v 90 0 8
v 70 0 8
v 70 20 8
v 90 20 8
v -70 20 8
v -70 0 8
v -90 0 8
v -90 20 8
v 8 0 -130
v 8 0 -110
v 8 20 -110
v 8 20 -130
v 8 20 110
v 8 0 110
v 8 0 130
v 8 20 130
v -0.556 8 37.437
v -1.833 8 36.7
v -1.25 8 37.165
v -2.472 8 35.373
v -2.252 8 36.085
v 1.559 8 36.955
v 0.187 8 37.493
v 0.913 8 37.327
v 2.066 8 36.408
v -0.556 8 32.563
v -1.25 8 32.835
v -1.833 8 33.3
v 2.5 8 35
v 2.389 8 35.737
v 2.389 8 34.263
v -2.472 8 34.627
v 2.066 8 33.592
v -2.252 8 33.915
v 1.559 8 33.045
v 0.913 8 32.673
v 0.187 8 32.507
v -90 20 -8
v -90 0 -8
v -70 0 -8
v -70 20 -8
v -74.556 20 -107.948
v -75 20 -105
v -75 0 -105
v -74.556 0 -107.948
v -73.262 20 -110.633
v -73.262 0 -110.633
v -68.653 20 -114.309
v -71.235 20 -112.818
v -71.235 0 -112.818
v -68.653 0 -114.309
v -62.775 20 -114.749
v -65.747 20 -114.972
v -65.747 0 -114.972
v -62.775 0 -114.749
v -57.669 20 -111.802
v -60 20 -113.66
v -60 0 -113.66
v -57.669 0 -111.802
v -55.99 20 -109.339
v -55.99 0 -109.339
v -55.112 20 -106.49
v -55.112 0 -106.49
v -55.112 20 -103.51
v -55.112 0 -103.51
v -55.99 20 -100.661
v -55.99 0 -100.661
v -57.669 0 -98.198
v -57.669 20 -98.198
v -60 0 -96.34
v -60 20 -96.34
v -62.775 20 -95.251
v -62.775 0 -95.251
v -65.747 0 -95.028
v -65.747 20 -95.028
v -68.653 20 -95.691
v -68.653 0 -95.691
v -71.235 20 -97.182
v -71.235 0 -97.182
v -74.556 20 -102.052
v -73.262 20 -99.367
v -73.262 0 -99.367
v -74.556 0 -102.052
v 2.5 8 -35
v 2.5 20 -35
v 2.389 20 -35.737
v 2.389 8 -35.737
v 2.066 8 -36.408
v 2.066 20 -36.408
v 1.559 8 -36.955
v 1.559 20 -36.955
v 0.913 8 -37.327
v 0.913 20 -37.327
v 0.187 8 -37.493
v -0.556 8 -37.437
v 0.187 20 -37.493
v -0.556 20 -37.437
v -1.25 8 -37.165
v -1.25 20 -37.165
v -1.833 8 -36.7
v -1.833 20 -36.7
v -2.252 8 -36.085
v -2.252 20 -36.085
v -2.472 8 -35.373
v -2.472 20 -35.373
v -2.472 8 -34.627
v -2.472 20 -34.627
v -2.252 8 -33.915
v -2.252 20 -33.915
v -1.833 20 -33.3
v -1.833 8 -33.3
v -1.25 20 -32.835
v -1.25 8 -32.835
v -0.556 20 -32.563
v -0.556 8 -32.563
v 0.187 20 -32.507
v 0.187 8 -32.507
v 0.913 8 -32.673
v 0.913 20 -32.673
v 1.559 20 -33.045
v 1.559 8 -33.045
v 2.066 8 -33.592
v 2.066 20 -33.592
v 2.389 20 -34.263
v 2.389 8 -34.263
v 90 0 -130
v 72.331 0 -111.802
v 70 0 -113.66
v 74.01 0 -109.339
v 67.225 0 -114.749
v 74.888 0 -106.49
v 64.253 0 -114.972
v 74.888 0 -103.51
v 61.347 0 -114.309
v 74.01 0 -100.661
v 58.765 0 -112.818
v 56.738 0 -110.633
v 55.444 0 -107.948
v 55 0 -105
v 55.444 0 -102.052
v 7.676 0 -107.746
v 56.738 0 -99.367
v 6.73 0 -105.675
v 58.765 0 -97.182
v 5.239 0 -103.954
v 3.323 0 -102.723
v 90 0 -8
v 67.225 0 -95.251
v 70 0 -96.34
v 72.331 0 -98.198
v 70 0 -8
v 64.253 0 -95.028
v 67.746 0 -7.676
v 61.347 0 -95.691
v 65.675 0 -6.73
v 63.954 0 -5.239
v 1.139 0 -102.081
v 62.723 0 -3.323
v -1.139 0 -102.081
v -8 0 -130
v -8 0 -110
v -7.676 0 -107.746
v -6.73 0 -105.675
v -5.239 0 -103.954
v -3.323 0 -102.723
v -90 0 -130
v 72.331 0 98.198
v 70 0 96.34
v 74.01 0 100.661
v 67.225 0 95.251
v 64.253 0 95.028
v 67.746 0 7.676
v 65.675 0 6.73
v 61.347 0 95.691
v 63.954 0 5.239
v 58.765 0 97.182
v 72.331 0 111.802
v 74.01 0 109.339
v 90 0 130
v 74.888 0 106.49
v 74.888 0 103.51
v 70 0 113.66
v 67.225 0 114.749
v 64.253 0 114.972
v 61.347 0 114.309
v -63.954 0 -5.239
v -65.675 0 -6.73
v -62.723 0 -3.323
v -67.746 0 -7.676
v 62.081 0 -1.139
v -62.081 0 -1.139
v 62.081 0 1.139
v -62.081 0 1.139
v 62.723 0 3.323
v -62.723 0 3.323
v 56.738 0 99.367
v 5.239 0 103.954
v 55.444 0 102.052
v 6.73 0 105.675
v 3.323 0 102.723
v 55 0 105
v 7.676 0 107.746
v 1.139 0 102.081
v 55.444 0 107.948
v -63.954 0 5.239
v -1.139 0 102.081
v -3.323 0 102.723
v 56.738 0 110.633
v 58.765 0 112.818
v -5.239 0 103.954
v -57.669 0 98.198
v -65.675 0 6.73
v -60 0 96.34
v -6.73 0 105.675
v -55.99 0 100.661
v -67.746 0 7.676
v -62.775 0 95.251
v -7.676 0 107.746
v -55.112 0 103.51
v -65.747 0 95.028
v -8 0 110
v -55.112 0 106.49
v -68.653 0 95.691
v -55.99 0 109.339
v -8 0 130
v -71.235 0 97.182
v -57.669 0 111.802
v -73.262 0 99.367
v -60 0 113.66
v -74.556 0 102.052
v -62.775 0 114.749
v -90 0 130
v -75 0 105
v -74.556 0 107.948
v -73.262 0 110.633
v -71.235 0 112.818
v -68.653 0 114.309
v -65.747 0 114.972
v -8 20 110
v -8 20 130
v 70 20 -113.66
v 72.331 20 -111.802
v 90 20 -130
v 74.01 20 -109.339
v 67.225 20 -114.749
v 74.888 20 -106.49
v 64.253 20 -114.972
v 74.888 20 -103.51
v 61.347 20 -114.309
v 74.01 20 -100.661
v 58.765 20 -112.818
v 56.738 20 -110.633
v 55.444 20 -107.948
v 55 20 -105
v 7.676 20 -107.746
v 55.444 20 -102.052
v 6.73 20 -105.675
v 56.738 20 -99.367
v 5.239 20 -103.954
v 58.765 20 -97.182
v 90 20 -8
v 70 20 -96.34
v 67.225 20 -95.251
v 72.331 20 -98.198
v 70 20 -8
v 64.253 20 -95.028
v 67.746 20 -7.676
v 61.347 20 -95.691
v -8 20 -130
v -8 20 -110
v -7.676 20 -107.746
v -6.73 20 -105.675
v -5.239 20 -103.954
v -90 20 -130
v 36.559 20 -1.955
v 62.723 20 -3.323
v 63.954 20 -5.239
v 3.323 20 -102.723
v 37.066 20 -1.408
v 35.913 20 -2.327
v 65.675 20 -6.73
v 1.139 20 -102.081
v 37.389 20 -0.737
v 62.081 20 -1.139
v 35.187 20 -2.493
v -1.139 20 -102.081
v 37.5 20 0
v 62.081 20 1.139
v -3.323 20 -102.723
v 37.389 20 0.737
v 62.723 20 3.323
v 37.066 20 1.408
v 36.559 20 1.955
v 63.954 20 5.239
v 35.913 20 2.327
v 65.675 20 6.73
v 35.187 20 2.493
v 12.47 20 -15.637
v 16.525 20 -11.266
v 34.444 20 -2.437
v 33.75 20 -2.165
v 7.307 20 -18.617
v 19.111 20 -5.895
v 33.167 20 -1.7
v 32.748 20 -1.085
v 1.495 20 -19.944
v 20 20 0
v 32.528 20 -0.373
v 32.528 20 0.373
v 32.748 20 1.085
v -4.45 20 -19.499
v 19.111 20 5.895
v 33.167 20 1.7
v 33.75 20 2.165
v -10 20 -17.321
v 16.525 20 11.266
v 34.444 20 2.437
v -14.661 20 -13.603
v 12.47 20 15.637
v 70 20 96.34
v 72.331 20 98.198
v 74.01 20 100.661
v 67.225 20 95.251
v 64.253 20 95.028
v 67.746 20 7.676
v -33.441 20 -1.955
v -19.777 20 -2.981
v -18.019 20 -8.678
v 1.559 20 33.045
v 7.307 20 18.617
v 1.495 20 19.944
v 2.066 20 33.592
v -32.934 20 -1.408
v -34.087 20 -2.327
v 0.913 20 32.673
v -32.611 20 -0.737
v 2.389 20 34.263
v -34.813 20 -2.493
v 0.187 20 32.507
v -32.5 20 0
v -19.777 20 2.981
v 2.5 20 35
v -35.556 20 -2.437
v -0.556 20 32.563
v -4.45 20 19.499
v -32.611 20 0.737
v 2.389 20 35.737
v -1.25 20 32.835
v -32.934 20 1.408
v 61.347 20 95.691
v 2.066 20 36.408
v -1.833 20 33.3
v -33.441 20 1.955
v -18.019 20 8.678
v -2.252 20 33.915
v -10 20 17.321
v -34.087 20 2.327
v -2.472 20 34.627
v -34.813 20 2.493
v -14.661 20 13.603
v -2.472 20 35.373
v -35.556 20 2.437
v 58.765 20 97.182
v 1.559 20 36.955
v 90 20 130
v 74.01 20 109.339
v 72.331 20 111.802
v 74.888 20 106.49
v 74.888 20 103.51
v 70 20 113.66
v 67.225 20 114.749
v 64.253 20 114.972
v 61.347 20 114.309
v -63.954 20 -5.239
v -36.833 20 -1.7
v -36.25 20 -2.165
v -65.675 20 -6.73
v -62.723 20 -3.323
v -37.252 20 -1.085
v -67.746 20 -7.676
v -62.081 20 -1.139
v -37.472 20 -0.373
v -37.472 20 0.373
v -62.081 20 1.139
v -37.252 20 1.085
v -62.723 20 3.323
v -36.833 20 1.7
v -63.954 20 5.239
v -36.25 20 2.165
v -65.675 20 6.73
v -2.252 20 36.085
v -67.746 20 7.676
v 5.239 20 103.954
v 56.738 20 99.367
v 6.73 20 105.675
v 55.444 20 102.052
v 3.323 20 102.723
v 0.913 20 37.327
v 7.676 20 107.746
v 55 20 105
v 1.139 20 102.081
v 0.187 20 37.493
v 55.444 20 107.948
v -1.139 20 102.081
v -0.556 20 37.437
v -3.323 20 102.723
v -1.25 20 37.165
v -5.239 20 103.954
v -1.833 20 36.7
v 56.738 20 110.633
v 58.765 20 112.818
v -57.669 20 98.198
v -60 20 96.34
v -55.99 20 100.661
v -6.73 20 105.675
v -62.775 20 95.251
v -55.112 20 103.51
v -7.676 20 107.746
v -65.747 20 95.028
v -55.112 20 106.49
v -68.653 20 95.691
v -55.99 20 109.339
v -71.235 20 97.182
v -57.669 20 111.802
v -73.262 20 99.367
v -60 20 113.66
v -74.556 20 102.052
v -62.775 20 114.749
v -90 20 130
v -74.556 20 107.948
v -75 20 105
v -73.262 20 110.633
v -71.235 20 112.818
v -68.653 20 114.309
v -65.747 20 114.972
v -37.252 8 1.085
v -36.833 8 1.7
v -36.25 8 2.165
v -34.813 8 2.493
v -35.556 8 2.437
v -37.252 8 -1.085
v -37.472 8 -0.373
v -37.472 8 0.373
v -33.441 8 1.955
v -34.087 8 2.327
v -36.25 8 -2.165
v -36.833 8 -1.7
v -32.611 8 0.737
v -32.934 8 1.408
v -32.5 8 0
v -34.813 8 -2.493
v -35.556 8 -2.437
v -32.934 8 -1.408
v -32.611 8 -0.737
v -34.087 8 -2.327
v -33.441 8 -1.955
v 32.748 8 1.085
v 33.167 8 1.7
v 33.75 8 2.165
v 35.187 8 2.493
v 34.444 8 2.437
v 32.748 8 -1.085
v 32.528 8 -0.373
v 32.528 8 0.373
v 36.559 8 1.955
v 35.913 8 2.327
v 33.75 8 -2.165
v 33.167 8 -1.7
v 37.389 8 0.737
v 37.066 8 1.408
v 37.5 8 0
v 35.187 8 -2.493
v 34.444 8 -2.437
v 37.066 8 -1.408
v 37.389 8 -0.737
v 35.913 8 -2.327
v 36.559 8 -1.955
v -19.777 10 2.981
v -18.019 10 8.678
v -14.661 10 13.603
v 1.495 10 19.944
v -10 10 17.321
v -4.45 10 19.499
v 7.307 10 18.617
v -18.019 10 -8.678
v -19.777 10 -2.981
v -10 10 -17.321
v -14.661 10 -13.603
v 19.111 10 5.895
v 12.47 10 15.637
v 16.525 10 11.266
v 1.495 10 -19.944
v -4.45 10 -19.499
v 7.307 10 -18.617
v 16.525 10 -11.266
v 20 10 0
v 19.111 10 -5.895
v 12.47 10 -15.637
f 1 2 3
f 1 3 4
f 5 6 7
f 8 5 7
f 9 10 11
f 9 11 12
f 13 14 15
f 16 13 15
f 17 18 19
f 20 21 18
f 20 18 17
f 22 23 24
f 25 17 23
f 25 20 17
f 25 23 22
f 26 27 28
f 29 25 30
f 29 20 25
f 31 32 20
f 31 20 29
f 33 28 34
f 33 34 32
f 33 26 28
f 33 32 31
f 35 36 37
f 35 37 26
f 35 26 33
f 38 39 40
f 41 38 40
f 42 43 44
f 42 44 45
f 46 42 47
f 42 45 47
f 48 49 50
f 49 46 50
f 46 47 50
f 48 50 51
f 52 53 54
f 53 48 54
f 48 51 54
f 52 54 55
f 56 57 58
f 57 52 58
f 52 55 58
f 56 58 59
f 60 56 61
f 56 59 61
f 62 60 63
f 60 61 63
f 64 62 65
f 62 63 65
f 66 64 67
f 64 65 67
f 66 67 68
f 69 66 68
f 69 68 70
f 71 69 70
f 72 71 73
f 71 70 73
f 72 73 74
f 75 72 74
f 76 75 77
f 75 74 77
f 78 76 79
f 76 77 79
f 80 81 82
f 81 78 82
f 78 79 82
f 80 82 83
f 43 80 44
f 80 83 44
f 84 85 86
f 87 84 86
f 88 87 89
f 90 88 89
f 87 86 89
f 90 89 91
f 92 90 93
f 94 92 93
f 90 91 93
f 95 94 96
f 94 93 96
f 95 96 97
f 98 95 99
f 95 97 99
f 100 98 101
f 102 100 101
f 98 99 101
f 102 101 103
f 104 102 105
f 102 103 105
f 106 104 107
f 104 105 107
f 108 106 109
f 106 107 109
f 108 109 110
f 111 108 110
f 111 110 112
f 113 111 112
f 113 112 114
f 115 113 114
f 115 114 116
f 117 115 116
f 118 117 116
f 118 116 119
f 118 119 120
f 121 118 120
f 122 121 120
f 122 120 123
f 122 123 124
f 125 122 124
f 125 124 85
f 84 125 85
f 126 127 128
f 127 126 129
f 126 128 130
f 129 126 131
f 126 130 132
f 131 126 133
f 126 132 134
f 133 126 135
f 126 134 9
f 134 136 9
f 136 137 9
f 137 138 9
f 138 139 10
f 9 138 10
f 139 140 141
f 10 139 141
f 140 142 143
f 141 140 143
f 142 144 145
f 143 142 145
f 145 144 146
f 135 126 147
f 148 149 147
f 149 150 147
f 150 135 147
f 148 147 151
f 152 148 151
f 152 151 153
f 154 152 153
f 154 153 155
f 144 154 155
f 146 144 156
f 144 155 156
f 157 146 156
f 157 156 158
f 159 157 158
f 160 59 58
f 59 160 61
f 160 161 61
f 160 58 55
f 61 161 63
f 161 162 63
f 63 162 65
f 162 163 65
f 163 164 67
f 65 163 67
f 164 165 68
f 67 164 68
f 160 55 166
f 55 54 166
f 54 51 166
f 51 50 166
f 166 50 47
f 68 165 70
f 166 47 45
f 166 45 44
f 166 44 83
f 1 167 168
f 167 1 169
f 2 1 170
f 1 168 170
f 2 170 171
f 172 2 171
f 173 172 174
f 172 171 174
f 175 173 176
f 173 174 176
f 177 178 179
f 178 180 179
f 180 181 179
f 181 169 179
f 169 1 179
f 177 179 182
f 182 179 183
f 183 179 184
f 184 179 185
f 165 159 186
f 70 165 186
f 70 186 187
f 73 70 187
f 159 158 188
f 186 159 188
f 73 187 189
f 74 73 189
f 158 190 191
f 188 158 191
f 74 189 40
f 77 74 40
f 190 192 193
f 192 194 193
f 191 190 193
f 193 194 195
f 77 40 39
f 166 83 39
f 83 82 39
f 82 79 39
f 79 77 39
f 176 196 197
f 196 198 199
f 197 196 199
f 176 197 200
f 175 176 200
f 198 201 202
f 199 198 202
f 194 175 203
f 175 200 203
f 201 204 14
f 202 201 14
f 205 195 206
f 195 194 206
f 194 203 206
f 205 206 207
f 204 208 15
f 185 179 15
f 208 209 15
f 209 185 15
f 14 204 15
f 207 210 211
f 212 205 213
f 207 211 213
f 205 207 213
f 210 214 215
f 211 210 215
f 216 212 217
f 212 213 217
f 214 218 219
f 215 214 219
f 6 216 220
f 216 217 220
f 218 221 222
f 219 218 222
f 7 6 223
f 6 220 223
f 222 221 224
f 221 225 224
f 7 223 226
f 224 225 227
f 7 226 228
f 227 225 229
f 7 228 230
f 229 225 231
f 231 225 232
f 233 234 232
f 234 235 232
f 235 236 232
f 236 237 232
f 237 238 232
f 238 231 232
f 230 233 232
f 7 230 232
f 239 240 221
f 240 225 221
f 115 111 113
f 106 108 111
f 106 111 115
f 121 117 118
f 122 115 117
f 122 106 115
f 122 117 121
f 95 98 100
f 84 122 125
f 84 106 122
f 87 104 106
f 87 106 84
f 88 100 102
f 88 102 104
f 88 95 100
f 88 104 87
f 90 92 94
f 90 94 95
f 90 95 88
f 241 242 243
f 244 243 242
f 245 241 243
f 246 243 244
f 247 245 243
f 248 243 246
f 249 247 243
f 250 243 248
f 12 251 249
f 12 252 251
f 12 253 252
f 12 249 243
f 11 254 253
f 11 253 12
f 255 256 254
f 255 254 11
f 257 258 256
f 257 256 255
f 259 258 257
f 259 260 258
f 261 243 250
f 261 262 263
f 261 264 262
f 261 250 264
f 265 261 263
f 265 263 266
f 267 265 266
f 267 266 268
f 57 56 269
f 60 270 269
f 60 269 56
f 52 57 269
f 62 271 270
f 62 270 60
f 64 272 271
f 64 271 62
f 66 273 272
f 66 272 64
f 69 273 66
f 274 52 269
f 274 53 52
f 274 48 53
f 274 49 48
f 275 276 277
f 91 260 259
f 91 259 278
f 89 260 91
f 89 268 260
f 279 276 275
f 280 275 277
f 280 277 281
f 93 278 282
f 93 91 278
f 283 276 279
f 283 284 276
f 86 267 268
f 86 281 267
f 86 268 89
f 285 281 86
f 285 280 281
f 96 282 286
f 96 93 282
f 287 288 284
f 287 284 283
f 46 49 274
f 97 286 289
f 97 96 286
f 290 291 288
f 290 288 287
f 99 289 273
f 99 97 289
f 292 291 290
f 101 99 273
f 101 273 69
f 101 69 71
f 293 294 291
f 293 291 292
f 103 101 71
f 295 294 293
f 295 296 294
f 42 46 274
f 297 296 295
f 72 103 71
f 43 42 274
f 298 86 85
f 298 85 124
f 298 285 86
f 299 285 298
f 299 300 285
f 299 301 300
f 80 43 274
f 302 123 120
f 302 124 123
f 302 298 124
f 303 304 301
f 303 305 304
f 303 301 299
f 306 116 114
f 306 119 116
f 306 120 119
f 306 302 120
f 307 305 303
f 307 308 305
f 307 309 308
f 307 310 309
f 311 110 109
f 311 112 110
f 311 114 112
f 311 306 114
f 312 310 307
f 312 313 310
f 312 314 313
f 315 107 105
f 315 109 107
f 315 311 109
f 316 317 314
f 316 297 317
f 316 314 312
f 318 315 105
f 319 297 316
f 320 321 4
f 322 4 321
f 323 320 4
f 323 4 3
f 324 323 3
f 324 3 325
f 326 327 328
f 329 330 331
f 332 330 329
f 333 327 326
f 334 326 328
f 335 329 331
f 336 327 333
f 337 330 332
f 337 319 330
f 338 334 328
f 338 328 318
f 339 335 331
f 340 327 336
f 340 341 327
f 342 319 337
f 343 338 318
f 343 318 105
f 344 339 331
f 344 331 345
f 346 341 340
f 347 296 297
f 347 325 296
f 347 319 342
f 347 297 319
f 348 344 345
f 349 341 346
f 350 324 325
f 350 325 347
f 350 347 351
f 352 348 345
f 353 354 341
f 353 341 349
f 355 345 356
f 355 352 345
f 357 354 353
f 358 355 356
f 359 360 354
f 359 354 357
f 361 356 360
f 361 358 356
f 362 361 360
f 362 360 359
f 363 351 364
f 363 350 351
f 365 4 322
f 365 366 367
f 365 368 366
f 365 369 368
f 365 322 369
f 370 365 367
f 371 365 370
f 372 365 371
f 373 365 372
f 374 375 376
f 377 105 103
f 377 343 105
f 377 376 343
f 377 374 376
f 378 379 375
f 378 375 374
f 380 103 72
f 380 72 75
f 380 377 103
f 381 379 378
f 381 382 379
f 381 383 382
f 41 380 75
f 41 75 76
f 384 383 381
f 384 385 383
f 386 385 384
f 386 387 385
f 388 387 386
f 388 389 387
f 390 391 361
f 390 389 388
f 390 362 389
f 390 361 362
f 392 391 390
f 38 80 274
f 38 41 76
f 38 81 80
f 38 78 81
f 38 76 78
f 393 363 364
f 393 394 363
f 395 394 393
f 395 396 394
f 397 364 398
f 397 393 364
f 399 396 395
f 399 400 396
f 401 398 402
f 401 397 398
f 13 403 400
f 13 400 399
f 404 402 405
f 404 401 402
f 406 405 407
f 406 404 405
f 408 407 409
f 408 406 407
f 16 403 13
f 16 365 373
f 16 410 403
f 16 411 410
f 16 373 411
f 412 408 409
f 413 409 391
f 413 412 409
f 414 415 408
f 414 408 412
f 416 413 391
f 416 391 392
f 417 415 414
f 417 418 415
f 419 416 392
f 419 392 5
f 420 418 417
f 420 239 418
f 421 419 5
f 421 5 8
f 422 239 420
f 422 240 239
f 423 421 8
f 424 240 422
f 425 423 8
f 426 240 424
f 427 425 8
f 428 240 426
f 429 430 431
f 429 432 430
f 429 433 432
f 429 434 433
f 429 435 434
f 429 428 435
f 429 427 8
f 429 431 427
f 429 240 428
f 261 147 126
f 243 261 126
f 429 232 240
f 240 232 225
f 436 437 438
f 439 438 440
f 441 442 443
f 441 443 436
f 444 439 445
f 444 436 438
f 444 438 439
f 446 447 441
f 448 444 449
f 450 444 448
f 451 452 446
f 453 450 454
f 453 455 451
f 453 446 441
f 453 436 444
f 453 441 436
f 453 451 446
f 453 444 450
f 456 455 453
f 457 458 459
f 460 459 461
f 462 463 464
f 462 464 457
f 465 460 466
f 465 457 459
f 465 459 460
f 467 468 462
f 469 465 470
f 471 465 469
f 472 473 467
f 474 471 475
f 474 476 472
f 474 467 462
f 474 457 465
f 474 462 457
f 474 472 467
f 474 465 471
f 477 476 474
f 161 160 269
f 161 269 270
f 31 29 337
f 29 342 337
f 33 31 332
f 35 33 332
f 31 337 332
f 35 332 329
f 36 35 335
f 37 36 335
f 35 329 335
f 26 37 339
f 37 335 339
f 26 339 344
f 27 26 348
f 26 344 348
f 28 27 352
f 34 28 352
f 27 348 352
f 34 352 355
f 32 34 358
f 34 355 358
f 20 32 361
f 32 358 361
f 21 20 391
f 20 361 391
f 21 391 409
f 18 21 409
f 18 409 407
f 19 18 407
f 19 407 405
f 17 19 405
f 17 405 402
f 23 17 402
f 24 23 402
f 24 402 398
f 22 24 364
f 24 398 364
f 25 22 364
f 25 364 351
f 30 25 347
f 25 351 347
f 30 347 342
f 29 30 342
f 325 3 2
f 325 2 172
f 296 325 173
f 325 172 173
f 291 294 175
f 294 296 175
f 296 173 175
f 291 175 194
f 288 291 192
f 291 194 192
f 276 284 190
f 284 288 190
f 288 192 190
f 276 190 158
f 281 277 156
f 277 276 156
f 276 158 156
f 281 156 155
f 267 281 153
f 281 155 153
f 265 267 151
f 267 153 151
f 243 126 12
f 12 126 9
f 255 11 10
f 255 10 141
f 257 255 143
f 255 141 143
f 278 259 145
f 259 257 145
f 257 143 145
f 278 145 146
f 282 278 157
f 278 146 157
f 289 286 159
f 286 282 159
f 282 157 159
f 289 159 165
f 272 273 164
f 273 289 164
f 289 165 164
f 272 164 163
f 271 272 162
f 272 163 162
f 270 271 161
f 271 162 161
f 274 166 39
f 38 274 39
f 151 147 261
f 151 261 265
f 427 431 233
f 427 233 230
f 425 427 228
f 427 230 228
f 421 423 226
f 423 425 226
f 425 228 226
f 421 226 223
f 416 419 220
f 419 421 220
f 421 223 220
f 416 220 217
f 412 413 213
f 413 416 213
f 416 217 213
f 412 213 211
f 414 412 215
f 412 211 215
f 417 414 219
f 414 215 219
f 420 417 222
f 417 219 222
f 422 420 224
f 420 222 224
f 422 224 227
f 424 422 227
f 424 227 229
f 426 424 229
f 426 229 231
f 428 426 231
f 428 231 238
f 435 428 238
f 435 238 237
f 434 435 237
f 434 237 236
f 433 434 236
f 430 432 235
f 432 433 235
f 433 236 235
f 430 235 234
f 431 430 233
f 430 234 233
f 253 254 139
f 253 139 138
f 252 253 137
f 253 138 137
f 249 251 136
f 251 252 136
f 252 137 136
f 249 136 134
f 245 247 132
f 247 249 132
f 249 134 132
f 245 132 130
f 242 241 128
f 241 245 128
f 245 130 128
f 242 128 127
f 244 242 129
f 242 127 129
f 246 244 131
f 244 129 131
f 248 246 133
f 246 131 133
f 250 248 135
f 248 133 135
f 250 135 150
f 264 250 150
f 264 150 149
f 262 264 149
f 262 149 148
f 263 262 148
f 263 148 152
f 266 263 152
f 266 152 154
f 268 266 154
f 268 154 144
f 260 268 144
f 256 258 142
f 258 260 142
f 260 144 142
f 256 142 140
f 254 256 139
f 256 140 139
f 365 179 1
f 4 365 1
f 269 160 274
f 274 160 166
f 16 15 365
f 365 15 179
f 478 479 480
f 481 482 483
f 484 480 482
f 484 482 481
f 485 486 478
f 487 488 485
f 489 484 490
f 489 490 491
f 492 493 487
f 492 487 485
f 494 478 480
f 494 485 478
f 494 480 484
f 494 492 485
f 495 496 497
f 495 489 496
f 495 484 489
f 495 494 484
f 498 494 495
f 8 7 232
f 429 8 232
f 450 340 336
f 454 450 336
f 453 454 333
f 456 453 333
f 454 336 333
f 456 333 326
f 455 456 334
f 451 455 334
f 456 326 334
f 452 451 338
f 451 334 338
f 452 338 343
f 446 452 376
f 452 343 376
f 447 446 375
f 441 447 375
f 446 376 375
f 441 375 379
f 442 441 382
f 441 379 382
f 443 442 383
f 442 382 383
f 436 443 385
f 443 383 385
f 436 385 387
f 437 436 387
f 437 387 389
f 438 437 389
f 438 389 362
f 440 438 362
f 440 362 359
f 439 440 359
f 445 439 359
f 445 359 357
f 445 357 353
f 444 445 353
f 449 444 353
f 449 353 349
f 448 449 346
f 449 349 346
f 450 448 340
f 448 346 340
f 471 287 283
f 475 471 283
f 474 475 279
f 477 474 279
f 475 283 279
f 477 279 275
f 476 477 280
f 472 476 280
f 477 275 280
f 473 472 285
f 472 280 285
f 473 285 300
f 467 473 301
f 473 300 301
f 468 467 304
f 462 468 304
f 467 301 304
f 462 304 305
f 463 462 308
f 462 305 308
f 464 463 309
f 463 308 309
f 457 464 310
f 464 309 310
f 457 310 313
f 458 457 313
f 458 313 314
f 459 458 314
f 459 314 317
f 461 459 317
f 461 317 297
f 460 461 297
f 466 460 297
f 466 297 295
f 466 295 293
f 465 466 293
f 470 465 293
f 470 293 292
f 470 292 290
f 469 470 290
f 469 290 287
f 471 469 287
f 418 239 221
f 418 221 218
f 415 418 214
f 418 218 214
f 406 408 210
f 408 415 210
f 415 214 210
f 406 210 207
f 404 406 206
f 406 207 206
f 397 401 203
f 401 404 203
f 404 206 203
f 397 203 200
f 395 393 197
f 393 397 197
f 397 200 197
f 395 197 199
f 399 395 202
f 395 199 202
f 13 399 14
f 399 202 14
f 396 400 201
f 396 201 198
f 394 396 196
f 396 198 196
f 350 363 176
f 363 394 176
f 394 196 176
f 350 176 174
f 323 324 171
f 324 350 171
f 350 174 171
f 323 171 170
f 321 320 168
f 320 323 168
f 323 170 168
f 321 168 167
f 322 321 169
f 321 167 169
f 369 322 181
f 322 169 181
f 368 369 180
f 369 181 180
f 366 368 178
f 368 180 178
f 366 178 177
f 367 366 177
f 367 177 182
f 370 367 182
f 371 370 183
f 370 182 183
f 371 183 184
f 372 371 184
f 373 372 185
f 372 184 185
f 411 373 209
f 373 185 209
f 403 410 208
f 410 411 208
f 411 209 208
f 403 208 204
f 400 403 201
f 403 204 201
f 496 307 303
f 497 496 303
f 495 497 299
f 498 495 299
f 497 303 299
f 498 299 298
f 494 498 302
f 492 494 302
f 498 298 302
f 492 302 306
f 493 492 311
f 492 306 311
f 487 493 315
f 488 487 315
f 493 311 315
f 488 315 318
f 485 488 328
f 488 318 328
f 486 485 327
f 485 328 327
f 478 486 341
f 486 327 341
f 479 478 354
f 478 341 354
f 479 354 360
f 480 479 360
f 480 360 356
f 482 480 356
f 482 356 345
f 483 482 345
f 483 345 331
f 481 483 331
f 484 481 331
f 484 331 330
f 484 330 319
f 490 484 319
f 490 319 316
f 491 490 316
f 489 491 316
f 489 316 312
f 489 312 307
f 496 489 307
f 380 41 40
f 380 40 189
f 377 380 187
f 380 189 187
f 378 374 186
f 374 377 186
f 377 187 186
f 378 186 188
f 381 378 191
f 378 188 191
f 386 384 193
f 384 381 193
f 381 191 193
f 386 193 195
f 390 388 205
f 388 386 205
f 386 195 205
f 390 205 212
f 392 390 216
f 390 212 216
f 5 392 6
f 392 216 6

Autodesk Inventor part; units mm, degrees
ref_plane "YZ Plane" through (0, 0, 0) normal (1, 0, 0) x (0, 1, 0)
ref_plane "XZ Plane" through (0, 0, 0) normal (0, 1, 0) x (-1, 0, 0)
ref_plane "XY Plane" through (0, 0, 0) normal (0, 0, 1) x (1, 0, 0)
sketch "Sketch2" plane through (0, 0, 0) normal (0, 1, 0) x (-1, 0, 0)
  line L0 (90, 130) -> (-90, -130) construction
  line L1 (-90, 130) -> (90, -130) construction
  circle A0 centre (65, 105) radius 10
  circle A1 centre (-65, 105) radius 10
  circle A2 centre (-65, -105) radius 10
  circle A3 centre (65, -105) radius 10
  line L2 (0, 65.8121) -> (0, -50.2865) construction
  line L3 (90, 0) -> (70, 0) construction
  line L4 (90, -8) -> (70, -8)
  line L5 (70, 8) -> (90, 8)
  arc A4 (70, 8) -> (70, -8) centre (70, 0) ccw
  line L6 (-90, -8) -> (-70, -8)
  line L7 (-70, 8) -> (-90, 8)
  arc A5 (-70, -8) -> (-70, 8) centre (-70, 0) ccw
  line L8 (90, -130) -> (90, -8)
  line L9 (90, 8) -> (90, 130)
  line L10 (-90, 130) -> (-90, 8)
  line L11 (-90, -8) -> (-90, -130)
  line L12 (0, -110) -> (0, -154.4719) construction
  line L13 (-8, -110) -> (-8, -130)
  line L14 (8, -130) -> (8, -110)
  arc A6 (8, -110) -> (-8, -110) centre (0, -110) ccw
  line L15 (25.1981, 0) -> (-33.3058, 0) construction
  line L16 (-8, 110) -> (-8, 130)
  line L17 (8, 130) -> (8, 110)
  arc A7 (-8, 110) -> (8, 110) centre (0, 110) ccw
  line L18 (90, 130) -> (8, 130)
  line L19 (-8, 130) -> (-90, 130)
  line L20 (-90, -130) -> (-8, -130)
  line L21 (8, -130) -> (90, -130)
  point P0 (0, 0)
  point P1 (80, 0)
  point P2 (0, -132.2359)
  point P3 (8, 154.4719)
  dimension "d2" = 180
  dimension "d3" = 260
  dimension "d4" = 20
  dimension "d6" = 65
  dimension "d7" = 65
  dimension "d9" = 65
  dimension "d12" = 65
  dimension "d16" = 8
  dimension "d18" = 8
  dimension "d33" = 180
  dimension "d34" = 260
extrude "Extrusion2" add sketch "Sketch2" along normal blind 20
sketch "Sketch3" plane through (0, 20, 0) normal (0, 1, 0) x (1, 0, 0)
  circle A0 centre (0, 35) radius 2.5
  circle A1 centre (-35, 0) radius 2.5
  circle A2 centre (0, -35) radius 2.5
  circle A3 centre (35, 0) radius 2.5
  point P0 (0, 0)
  dimension "d22" = 5
  dimension "d23" = 35
  dimension "d26" = 360
extrude "Extrusion3" cut sketch "Sketch3" against normal blind 12
sketch "Sketch4" plane through (0, 20, 0) normal (0, 1, 0) x (1, 0, 0)
  circle A0 centre (0, 0) radius 20
  dimension "d30" = 40
extrude "Extrusion4" cut sketch "Sketch4" against normal blind 10
properties part number "Base inferior da ferramenta"
